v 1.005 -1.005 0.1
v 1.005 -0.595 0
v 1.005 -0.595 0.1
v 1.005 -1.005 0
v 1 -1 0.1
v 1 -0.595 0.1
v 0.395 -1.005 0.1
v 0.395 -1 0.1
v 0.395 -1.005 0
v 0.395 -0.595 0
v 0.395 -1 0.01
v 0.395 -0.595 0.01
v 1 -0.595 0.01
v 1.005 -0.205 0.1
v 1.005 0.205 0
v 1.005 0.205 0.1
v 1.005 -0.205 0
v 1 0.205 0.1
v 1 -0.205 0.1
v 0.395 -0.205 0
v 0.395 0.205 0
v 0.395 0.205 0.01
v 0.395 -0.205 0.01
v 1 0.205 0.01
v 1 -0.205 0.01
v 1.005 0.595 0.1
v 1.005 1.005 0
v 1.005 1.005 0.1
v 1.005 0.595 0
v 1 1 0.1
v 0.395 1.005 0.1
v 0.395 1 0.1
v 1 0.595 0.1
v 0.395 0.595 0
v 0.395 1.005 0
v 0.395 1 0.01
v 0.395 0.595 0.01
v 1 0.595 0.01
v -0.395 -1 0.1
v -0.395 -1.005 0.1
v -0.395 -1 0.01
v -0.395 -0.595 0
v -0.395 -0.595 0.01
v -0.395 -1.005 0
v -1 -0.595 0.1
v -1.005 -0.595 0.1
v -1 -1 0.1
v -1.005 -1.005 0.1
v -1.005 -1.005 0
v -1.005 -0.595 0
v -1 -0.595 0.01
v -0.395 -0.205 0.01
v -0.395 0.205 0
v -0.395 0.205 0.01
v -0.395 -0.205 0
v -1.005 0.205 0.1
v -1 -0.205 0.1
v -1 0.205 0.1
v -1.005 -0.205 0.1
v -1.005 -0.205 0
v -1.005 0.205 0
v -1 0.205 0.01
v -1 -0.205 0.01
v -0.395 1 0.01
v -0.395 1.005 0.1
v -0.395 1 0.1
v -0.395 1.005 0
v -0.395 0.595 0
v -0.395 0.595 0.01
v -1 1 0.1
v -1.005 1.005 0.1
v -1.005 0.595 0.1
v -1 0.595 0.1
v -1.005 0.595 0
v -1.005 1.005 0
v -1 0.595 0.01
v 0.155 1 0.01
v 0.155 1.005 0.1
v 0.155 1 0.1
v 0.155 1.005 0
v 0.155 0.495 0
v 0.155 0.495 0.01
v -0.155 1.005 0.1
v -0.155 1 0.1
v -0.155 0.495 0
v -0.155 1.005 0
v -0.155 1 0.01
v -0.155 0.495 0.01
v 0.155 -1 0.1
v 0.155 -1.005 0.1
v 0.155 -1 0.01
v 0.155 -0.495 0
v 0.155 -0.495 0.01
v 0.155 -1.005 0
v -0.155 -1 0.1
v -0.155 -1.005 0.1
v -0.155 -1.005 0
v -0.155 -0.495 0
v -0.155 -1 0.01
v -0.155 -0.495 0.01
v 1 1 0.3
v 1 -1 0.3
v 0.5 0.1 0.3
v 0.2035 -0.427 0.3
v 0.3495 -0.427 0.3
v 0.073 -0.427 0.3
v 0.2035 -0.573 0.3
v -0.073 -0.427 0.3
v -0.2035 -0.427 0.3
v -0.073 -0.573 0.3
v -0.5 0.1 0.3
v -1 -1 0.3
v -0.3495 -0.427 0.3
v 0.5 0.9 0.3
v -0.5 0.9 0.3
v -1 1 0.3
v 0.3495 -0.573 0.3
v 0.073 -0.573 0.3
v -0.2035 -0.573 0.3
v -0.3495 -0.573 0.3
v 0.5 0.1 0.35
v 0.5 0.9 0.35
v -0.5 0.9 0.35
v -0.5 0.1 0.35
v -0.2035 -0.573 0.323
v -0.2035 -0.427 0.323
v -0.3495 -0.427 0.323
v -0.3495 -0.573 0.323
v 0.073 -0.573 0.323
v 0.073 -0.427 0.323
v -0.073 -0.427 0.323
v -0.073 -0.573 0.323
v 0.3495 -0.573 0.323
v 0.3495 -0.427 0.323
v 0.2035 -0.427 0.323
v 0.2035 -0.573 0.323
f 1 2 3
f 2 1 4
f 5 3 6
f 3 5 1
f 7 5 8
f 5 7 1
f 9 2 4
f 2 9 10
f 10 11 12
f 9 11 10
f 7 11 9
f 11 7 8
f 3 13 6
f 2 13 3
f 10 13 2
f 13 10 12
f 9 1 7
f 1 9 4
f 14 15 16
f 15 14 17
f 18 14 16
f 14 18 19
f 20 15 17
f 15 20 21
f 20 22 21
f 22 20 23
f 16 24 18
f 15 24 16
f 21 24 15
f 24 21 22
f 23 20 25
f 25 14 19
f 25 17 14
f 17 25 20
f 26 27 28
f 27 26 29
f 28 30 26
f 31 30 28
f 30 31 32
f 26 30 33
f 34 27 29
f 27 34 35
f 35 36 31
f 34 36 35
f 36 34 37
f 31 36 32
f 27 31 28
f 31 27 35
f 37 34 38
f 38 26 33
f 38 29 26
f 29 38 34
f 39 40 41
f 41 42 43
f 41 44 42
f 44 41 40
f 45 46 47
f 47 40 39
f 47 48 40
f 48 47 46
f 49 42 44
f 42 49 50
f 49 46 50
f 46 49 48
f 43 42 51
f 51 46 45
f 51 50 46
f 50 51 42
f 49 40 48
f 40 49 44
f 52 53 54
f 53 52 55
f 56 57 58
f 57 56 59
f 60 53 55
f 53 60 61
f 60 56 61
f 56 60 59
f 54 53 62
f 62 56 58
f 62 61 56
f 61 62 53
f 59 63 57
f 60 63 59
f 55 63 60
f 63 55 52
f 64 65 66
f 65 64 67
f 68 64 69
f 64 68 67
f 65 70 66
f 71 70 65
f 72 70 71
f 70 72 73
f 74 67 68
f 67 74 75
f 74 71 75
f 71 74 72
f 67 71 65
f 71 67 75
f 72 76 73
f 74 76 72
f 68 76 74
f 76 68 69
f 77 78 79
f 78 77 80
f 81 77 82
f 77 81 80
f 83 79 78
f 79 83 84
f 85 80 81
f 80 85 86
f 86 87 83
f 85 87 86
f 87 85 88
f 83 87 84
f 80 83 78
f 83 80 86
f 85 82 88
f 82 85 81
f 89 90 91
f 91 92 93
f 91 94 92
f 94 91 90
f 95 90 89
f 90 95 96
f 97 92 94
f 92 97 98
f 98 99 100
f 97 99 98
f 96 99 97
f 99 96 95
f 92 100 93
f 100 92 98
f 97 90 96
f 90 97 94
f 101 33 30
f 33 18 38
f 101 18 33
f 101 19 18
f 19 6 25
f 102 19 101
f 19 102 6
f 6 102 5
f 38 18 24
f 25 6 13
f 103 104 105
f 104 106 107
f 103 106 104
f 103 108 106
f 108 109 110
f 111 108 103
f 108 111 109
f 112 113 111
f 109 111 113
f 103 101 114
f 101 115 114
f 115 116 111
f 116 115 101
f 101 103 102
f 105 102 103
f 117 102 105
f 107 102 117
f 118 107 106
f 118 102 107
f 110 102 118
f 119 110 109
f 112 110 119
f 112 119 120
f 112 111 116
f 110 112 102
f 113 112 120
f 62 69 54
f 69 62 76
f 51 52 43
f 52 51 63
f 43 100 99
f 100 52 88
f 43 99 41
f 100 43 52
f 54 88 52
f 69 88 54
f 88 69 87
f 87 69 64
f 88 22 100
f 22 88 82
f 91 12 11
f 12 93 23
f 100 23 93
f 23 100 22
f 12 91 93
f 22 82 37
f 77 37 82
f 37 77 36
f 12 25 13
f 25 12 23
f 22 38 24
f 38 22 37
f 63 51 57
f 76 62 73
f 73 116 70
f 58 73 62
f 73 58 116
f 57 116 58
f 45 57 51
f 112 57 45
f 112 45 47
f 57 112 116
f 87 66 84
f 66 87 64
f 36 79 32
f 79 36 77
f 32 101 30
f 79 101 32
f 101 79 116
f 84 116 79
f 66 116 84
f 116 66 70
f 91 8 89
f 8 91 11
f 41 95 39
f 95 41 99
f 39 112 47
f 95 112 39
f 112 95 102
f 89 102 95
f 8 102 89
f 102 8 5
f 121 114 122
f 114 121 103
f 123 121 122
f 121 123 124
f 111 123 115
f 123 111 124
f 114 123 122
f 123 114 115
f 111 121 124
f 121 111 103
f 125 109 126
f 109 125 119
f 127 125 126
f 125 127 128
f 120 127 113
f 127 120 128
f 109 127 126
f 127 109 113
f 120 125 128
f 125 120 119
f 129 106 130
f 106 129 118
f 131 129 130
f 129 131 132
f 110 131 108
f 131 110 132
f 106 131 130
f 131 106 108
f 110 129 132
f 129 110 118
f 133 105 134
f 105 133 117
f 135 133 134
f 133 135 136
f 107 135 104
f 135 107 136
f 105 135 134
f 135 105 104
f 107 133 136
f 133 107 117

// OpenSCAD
APA102();
module APA102(){
  //APA102-2020
  //http://www.normandled.com/upload/201807/APA102-2020%20LED%20Datasheet.pdf
  
  //alias Adafruit Dotstar
  ovDims=[2,2,0.9];
  padDims=[0.6,0.4,0.1];
  ICDims=[1,0.8,0.1];
  mfudge=0.01; //microfudge
  ICPos=[0,0.5,0.3];
  
  //PCB
  color("darkgreen") translate([0,0,ovDims.z/6+mfudge/2]) cube([ovDims.x,ovDims.y,ovDims.z/3-mfudge],true);
  //Resin
  %difference(){
    color("gold",0.5) translate([0,0,ovDims.z*0.66/2+ovDims.z/3]) cube([ovDims.x,ovDims.y,ovDims.z*0.66-mfudge],true);
    translate(ICPos) cube(ICDims+[mfudge,mfudge,mfudge],true); //substract IC cavity to make transparency work
    for (i=[-0.2765,0,0.2765]) translate([i,-0.5,0.25]) cube(0.146+mfudge,true);
  }
  //pads
  for (i=[1,-1],j=[-1,0,1])
    color("silver") translate([i*(1-padDims.x/2),j*(1-padDims.y/2),padDims.z/2]) cube(padDims+[mfudge,mfudge,0],true);
  for (j=[1,-1])
    color("silver") translate([0,j*(1-0.5/2),padDims.z/2]) cube([0.3+mfudge,0.5+mfudge,padDims.z],true);
  //IC
  color("darkslategrey") translate(ICPos) cube([1,0.8,0.1],true);
  //LEDs (yes, really)
  
    color("red") translate([-0.2765,-0.5,0.25]) cube(0.146,true);
    color("green") translate([0,-0.5,0.25]) cube(0.146,true);
    color("blue") translate([0.2765,-0.5,0.25]) cube(0.146,true);
}
